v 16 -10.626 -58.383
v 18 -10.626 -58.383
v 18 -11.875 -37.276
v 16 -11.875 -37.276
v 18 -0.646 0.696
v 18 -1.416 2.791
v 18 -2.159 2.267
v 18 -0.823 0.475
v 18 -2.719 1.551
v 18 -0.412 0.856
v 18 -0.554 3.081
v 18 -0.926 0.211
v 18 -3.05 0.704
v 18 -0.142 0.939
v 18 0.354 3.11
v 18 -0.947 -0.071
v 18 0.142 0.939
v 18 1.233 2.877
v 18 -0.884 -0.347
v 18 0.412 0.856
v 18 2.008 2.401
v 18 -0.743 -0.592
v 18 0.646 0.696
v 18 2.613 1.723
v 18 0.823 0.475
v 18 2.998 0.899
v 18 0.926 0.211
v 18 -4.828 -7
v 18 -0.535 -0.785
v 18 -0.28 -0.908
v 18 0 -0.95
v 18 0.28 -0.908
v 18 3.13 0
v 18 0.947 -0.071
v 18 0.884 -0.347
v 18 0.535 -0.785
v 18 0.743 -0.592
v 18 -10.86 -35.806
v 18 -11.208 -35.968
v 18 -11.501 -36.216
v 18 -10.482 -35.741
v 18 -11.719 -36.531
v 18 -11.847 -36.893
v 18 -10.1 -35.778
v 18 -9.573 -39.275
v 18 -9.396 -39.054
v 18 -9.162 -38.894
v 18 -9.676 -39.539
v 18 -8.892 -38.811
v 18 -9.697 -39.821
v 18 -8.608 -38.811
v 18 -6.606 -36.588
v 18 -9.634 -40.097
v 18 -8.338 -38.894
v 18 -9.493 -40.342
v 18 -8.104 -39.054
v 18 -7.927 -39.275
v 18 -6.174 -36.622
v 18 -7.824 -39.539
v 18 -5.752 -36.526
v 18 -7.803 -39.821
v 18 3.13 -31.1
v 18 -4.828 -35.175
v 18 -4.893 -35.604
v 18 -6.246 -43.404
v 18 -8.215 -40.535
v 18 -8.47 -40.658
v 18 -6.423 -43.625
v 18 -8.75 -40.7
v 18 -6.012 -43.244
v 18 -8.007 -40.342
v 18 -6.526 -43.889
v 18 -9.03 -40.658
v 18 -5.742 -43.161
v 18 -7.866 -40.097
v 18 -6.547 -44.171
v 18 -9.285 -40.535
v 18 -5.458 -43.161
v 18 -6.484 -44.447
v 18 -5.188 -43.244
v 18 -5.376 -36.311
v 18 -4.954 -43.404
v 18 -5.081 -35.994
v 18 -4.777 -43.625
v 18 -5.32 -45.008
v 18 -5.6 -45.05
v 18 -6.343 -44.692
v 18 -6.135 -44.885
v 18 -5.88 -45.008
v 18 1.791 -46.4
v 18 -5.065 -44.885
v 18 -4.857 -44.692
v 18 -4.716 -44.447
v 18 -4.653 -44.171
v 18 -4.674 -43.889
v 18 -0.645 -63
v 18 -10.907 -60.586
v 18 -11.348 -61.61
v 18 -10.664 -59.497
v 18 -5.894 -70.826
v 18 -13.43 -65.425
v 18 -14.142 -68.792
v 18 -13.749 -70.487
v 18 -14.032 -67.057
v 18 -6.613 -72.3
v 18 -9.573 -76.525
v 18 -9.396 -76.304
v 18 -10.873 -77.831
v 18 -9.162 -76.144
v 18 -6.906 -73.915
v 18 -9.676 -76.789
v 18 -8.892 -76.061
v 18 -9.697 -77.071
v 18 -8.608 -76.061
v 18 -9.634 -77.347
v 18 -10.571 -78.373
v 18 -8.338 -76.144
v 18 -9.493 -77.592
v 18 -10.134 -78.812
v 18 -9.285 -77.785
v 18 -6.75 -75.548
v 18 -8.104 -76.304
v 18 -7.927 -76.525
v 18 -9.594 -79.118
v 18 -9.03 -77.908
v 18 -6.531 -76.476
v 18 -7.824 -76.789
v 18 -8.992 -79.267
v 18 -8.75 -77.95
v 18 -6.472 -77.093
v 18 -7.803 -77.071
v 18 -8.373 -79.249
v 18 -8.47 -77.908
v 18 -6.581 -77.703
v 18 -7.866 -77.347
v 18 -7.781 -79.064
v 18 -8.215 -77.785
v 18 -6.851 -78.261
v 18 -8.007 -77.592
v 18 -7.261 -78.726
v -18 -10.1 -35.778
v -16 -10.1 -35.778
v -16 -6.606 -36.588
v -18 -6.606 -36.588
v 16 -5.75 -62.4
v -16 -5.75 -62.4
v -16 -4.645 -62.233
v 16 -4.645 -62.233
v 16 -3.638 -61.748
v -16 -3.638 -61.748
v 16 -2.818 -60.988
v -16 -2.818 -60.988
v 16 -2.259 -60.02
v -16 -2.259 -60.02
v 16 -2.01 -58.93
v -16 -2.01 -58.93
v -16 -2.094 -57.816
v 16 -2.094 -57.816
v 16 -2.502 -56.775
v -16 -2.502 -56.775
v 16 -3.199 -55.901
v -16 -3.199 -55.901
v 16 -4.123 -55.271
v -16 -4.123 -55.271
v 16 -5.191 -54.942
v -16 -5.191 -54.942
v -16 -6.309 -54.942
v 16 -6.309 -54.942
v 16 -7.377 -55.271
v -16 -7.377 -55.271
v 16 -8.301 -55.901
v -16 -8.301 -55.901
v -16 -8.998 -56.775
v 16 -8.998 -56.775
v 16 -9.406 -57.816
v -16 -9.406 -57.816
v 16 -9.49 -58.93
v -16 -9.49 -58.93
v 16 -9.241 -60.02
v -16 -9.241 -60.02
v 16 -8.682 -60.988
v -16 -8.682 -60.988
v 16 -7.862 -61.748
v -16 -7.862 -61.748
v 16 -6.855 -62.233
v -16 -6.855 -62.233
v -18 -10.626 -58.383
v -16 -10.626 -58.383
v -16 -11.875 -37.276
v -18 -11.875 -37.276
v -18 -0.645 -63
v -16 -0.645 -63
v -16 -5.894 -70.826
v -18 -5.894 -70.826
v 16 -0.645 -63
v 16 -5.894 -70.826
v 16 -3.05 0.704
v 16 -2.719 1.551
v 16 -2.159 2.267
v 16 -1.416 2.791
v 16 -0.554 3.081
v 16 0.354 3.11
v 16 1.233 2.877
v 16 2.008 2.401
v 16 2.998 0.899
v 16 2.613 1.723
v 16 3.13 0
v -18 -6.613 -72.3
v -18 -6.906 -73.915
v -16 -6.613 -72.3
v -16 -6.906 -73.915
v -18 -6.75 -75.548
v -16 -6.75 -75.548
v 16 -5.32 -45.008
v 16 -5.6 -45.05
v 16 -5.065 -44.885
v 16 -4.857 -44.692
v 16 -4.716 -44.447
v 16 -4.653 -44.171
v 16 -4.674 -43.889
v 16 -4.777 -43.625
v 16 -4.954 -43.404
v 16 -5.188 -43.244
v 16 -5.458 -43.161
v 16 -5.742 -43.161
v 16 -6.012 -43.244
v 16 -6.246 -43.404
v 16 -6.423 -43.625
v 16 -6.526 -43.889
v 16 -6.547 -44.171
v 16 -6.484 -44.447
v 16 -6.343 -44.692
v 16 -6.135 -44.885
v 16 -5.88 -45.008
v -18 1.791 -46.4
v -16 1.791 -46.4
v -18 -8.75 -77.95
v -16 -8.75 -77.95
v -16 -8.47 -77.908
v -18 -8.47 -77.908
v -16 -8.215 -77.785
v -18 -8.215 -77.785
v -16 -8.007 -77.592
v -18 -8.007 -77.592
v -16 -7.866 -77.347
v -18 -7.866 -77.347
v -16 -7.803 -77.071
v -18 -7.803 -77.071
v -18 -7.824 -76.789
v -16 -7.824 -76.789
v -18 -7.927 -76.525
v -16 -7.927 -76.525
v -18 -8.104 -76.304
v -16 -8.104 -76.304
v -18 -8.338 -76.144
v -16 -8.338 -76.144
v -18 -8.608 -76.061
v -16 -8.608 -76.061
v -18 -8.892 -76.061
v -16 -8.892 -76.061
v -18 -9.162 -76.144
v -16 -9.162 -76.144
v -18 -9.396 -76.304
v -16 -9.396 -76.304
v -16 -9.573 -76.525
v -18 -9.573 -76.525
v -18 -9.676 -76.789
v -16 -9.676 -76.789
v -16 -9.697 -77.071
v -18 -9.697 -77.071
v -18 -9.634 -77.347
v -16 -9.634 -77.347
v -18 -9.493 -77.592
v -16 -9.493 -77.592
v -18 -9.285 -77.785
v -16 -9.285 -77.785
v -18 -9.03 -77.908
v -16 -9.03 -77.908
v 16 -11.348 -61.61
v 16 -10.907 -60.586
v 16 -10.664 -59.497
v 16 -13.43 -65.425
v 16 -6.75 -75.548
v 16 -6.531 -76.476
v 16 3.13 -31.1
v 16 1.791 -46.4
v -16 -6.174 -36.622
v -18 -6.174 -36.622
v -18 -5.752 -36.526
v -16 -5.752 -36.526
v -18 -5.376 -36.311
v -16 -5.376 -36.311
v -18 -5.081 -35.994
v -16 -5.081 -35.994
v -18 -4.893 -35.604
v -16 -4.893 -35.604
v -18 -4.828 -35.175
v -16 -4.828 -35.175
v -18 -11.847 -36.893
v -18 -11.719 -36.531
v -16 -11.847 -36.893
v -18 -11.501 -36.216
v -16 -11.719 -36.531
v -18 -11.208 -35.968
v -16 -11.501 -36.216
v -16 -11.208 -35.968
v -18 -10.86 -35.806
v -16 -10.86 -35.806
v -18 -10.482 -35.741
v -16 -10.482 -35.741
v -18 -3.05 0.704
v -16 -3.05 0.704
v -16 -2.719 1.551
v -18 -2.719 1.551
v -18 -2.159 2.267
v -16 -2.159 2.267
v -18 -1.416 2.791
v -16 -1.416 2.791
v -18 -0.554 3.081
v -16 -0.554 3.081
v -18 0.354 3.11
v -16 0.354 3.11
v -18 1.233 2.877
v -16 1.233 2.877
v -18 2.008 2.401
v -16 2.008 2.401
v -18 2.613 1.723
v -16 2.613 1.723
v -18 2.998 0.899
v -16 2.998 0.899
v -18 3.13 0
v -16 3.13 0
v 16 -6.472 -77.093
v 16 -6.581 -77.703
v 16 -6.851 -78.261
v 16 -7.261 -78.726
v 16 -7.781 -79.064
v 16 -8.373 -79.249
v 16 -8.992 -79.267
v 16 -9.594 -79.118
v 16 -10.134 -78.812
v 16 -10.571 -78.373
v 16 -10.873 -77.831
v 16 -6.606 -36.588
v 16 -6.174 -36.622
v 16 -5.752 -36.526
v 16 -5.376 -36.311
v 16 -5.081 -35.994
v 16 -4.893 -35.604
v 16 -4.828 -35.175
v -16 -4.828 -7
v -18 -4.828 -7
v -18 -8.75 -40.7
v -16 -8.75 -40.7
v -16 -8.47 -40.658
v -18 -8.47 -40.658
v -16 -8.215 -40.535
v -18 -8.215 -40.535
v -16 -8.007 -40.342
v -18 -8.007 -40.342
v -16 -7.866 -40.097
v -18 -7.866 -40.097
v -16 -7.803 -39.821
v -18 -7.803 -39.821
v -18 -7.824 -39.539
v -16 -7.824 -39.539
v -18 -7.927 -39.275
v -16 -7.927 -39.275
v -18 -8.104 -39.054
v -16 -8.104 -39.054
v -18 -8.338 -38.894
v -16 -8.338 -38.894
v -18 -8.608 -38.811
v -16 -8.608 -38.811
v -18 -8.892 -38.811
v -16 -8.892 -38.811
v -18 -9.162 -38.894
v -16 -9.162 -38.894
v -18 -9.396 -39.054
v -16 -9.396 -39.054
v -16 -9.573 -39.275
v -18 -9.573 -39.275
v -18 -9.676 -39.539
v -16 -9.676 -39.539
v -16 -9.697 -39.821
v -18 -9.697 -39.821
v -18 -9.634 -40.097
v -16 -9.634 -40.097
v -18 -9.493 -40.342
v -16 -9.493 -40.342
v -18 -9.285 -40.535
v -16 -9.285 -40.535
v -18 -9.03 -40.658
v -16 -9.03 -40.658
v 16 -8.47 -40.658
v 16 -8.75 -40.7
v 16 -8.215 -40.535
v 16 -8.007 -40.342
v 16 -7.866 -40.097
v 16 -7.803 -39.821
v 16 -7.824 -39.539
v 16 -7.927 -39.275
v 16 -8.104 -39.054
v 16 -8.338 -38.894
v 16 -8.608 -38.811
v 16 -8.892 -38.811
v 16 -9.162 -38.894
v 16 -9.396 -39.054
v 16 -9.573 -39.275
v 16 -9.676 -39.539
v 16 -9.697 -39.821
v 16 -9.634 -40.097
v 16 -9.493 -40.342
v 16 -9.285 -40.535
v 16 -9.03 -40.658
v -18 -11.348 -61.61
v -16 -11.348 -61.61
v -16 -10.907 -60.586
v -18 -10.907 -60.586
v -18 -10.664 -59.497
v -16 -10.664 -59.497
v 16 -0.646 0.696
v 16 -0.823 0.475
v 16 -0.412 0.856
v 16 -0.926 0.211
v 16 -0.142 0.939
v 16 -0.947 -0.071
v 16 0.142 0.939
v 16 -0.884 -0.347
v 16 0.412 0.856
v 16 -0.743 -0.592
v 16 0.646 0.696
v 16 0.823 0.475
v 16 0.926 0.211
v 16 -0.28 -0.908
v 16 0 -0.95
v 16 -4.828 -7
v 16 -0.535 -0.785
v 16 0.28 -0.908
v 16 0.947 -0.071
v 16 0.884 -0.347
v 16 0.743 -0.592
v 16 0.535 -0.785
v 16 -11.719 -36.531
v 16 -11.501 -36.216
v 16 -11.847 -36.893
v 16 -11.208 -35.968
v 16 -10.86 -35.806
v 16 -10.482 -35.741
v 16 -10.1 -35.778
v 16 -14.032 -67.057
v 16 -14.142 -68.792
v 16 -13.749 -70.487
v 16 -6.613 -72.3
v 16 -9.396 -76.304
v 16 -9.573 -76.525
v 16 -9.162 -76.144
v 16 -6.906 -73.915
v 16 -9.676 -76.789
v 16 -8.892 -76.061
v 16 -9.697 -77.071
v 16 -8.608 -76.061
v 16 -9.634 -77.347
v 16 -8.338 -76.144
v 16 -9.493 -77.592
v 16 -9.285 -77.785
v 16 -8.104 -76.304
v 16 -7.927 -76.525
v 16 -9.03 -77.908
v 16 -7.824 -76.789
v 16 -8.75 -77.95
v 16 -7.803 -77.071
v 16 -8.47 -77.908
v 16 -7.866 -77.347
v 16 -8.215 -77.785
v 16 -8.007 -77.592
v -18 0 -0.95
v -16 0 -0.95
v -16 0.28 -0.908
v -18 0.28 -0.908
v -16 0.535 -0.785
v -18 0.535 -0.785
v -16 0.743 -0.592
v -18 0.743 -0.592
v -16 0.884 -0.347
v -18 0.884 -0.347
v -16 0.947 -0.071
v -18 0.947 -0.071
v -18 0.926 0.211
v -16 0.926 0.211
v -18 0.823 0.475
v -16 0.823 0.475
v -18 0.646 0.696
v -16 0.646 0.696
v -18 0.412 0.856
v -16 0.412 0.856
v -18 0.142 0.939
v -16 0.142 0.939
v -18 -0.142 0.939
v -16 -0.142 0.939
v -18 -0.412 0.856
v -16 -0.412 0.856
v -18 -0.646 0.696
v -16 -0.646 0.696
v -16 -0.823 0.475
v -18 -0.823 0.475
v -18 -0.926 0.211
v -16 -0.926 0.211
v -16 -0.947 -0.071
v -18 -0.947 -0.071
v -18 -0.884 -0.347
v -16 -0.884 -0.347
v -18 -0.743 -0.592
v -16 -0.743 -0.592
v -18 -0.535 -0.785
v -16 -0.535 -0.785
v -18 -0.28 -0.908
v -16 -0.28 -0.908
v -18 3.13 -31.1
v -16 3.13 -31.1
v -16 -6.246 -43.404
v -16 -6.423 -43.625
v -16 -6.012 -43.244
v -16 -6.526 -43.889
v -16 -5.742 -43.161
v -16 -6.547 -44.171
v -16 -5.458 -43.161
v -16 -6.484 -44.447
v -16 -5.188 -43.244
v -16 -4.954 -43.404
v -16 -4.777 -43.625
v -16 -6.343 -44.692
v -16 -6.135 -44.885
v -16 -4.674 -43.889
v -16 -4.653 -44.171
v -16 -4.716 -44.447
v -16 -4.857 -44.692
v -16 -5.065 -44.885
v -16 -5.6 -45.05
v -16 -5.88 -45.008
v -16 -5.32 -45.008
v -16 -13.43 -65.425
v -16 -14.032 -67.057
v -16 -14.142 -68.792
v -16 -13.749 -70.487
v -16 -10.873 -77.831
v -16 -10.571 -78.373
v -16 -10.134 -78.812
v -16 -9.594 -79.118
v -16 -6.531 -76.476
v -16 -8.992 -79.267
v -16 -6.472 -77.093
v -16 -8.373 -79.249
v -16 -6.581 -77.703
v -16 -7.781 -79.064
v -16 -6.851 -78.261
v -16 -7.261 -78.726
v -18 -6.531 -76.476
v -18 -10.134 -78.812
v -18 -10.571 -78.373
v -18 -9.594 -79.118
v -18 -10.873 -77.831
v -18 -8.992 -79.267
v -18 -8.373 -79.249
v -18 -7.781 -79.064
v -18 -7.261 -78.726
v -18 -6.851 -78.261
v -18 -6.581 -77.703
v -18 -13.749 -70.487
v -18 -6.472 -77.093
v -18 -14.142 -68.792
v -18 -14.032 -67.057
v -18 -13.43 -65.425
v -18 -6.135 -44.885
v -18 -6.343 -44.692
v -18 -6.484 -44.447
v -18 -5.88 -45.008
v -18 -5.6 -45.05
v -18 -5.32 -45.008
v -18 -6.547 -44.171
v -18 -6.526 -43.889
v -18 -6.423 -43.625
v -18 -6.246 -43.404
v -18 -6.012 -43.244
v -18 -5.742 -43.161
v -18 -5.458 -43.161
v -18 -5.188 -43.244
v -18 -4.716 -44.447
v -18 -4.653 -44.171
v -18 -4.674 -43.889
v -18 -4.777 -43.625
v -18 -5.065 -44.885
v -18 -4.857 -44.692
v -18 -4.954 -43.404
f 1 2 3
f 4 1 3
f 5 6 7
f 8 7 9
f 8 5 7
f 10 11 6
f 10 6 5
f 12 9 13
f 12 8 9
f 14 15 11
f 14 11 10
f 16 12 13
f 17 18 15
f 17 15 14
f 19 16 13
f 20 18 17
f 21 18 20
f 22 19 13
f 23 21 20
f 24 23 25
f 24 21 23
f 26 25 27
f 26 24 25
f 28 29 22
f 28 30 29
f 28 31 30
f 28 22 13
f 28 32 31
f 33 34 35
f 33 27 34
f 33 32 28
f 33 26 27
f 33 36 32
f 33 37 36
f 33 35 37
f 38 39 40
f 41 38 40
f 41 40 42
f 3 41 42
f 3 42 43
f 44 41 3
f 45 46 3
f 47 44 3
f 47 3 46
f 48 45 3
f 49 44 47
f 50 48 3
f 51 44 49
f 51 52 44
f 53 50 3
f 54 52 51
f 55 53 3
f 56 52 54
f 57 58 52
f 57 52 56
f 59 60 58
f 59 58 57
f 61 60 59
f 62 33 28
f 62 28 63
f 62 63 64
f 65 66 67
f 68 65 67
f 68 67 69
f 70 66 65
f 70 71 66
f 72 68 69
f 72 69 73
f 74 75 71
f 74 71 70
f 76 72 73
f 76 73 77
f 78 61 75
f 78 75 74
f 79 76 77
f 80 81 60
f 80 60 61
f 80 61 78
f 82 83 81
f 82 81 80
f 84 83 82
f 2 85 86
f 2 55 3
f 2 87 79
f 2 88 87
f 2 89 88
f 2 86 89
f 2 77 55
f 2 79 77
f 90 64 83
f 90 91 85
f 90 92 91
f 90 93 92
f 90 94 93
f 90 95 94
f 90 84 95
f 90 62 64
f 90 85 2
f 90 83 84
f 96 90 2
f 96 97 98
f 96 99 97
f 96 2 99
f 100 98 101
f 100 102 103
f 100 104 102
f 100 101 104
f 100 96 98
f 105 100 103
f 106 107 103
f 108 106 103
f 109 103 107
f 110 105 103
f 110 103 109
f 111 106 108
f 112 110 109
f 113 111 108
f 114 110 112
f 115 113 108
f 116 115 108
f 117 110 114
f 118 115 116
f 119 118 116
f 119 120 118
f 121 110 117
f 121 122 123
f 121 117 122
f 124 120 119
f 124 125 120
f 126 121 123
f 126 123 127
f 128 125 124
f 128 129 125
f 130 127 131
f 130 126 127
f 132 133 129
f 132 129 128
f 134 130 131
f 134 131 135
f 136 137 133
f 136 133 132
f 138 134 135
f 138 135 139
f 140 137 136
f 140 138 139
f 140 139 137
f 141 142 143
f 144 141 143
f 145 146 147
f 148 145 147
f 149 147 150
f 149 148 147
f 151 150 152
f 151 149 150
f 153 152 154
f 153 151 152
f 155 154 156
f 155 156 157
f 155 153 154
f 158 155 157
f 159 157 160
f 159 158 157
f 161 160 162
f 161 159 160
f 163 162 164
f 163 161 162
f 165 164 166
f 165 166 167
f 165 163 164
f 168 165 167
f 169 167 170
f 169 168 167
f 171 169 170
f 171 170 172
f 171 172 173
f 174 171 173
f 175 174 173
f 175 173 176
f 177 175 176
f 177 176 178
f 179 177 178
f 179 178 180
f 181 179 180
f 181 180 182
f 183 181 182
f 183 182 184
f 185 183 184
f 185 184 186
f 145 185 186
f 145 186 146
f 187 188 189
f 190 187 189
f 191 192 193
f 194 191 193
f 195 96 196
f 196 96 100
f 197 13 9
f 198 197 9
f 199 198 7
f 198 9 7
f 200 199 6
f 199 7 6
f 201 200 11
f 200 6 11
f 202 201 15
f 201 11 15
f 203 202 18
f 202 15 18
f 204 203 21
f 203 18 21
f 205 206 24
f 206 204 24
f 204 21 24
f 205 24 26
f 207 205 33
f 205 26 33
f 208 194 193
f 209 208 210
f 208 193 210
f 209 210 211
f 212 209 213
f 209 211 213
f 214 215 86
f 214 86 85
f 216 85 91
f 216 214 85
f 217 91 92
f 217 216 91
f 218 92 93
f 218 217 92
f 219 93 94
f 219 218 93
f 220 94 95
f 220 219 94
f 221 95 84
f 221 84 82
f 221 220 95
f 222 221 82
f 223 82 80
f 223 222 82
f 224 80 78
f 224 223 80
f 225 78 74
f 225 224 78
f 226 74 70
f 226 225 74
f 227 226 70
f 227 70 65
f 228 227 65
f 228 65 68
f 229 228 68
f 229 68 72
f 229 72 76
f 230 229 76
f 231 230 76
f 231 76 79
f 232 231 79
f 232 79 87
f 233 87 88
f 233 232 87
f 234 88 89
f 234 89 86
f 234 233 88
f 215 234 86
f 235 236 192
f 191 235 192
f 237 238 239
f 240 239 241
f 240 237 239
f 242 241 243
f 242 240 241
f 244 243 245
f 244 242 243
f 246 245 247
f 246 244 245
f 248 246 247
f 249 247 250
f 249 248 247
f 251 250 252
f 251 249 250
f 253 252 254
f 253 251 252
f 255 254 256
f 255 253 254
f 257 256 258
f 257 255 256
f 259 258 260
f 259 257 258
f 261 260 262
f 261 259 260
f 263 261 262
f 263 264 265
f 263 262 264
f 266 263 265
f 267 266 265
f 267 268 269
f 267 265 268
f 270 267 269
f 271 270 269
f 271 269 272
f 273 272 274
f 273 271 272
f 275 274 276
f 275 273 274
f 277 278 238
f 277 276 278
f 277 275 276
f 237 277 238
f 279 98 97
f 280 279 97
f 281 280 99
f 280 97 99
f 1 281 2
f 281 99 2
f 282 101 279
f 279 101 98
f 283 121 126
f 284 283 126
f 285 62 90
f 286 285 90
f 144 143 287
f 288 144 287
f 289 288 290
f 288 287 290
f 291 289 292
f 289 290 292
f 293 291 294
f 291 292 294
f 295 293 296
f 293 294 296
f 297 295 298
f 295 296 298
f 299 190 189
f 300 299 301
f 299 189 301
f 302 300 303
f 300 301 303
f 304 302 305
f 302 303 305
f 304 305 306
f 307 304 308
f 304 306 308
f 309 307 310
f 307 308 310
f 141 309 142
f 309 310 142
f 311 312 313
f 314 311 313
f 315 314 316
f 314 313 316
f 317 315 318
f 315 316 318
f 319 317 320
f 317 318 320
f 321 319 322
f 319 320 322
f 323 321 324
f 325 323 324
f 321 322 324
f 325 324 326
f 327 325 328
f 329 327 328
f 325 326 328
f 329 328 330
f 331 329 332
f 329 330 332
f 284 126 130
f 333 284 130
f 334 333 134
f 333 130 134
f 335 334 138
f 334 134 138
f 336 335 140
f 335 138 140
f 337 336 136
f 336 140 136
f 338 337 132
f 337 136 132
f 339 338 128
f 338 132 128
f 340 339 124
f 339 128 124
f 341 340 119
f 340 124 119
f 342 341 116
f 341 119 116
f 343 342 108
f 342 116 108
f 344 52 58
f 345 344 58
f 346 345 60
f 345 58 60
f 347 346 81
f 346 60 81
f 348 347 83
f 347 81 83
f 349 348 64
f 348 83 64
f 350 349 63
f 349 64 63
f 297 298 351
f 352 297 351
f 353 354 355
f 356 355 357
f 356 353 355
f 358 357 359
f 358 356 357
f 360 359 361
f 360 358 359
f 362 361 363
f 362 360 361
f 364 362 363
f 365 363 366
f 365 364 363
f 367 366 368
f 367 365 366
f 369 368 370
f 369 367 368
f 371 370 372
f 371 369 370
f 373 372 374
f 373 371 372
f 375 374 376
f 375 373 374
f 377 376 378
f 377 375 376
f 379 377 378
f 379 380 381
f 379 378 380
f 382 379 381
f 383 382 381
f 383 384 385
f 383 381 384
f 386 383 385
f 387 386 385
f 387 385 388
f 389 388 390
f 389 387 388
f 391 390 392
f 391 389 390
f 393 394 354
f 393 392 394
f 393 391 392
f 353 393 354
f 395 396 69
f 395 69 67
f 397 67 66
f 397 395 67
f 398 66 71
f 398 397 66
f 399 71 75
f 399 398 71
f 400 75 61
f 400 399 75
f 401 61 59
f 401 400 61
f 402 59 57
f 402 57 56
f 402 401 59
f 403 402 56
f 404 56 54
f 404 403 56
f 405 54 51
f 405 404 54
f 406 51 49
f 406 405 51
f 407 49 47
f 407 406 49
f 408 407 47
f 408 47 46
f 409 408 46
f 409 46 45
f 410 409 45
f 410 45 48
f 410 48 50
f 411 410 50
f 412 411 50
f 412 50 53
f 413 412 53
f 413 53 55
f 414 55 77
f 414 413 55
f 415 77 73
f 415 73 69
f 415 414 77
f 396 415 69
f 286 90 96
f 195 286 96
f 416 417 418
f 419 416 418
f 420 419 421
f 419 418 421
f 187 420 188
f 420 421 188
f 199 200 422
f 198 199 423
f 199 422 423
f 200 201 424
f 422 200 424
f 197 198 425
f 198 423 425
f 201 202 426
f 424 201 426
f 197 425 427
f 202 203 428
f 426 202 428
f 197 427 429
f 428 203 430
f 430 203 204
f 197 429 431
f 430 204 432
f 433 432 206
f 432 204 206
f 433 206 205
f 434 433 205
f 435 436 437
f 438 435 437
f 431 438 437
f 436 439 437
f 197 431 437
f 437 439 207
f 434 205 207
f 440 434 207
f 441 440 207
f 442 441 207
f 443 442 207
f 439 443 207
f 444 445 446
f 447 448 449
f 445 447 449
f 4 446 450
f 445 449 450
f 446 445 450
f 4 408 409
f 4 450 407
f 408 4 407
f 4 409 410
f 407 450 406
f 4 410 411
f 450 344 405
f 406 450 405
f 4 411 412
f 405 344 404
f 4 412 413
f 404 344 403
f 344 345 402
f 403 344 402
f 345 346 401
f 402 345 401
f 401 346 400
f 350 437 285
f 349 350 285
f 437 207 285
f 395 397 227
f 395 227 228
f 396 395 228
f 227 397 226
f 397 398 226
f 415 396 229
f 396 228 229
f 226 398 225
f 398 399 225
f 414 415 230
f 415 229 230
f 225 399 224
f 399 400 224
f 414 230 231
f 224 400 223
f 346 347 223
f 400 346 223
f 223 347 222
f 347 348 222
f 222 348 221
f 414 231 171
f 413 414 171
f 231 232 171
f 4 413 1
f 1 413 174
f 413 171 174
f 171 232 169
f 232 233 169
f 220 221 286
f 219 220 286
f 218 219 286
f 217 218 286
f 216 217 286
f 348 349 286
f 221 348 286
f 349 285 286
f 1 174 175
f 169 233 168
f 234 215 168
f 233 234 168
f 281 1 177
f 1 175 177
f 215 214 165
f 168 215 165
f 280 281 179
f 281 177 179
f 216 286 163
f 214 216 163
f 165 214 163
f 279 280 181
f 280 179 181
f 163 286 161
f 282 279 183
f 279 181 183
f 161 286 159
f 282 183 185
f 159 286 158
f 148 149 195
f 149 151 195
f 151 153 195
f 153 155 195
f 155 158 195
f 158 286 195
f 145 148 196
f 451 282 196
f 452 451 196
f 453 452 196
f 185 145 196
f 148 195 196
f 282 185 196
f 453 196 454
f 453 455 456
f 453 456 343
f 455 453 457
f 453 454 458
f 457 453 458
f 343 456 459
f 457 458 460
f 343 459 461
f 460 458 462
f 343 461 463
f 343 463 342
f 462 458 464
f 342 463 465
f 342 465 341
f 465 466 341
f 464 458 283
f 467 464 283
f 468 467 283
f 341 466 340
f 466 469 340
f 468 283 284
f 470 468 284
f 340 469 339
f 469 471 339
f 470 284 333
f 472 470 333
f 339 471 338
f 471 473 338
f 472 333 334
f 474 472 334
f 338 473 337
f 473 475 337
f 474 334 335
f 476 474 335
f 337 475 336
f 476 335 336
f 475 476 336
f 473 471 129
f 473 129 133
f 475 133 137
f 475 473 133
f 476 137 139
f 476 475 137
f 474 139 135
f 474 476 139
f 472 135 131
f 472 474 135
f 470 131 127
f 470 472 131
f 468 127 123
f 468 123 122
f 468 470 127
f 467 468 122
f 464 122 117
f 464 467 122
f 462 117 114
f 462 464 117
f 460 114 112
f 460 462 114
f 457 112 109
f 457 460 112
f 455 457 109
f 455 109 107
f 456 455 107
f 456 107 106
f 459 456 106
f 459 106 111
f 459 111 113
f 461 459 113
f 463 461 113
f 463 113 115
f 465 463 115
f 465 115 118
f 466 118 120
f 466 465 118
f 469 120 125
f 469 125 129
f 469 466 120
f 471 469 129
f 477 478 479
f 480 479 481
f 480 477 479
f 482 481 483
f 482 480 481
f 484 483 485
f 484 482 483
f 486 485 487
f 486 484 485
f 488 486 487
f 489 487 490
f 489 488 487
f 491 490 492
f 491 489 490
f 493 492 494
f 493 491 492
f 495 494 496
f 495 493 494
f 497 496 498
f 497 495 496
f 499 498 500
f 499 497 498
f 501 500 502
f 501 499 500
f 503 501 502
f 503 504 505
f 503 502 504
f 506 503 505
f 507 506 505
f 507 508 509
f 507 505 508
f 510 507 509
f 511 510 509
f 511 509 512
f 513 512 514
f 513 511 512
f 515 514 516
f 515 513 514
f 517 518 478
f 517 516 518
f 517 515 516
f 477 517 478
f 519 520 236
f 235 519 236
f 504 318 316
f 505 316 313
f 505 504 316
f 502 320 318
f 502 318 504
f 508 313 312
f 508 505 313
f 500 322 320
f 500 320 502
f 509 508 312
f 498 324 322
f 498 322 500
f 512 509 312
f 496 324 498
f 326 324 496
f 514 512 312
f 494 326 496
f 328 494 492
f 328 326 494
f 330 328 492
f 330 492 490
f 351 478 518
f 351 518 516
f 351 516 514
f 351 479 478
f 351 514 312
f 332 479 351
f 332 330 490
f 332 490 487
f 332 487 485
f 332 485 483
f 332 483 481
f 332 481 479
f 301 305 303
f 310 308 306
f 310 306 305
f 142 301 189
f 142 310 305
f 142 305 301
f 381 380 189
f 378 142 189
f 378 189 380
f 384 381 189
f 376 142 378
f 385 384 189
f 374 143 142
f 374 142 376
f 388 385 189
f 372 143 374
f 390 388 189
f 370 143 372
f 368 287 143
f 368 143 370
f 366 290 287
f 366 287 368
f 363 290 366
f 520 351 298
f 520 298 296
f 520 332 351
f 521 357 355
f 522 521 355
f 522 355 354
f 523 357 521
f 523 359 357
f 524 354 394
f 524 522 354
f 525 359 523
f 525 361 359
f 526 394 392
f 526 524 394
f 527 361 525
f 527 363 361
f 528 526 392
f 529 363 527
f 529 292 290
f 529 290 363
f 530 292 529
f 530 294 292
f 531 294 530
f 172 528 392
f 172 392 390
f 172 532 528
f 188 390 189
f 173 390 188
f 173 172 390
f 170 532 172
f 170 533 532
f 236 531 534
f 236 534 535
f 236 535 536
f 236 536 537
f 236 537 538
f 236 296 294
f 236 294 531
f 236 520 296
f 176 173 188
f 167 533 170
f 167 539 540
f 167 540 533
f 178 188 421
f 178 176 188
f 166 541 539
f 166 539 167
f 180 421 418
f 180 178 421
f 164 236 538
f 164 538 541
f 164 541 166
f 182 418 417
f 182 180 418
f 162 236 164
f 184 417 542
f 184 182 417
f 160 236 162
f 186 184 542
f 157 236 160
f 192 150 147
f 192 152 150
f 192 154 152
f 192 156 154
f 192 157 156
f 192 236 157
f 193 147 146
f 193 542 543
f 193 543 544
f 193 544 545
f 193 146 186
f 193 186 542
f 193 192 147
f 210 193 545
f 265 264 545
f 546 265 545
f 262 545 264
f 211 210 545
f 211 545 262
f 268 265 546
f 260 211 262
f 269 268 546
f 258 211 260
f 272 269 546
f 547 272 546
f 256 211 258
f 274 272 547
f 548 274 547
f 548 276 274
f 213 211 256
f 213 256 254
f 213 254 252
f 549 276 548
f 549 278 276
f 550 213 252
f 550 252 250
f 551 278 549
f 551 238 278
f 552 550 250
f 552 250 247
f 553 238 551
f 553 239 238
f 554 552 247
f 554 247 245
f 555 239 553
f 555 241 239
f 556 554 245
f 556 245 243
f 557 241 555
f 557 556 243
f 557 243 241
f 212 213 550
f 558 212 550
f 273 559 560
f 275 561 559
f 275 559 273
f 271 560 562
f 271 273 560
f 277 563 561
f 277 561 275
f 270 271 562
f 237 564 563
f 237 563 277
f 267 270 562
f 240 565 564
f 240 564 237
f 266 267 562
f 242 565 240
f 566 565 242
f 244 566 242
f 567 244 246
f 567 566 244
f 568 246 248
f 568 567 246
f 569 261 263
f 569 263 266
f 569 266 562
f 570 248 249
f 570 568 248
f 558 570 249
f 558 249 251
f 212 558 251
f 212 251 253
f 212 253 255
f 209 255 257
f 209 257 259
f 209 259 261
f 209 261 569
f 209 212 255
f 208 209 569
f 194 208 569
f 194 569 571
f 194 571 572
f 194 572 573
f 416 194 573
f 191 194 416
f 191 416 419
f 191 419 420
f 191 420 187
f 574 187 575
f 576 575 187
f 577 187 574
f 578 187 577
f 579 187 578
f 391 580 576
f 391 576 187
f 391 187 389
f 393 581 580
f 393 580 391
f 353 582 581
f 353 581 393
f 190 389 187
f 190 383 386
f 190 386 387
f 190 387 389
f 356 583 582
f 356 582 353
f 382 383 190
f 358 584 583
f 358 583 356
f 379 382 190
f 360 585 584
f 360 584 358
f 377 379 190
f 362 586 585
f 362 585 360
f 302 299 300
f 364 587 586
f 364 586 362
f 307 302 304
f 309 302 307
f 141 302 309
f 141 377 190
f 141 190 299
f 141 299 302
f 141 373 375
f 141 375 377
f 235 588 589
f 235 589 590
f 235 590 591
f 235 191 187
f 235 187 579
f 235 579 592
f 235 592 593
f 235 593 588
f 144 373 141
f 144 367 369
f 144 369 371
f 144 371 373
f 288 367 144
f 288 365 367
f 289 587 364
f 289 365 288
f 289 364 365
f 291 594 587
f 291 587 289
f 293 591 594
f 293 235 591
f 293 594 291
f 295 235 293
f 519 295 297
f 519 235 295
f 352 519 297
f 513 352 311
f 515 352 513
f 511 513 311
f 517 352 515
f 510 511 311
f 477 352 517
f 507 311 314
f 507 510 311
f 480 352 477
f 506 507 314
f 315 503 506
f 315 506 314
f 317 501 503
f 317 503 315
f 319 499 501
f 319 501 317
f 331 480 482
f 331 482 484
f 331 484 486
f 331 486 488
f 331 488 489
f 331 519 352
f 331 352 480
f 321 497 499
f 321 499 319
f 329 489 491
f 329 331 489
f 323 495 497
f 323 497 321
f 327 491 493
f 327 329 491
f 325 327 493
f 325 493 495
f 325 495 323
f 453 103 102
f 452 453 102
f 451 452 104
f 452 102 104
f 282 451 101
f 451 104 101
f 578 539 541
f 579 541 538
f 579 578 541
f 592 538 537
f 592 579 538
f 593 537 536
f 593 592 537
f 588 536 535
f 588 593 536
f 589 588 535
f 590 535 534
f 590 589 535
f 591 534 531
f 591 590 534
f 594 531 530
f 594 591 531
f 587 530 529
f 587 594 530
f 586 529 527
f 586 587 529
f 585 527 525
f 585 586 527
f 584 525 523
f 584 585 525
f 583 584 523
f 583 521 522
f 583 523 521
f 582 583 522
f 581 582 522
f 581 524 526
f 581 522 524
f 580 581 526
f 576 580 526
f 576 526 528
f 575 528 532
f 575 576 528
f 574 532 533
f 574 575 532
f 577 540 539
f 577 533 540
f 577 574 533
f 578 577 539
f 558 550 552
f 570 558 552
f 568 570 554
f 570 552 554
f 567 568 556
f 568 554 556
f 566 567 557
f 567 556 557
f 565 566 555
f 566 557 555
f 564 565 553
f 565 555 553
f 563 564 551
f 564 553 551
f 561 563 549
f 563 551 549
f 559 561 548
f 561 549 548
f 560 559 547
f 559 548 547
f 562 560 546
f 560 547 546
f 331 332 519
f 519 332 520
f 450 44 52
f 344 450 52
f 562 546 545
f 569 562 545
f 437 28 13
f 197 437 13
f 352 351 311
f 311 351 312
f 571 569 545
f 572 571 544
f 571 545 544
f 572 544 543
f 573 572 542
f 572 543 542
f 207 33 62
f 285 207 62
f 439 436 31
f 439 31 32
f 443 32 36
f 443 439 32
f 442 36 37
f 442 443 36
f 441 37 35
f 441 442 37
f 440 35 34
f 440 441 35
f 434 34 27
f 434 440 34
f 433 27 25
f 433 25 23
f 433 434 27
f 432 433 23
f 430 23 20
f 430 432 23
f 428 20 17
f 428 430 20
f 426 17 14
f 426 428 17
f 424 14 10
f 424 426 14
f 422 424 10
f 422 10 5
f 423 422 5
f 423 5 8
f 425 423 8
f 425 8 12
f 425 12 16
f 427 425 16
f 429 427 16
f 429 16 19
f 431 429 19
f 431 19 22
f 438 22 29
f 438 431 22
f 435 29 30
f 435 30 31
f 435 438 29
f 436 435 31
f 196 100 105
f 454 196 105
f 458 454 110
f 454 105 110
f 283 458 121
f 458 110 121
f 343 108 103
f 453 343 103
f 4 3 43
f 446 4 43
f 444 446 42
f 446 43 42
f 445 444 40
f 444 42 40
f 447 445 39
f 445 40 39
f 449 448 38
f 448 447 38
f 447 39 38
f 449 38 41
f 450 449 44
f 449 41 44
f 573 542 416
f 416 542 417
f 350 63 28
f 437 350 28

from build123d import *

# Parameters (mm, degrees)
SKETCH1_R           = 0.95
BOSS_EXTRUDE1_DEPTH = 18
SKETCH2_W           = 32
SKETCH2_H           = 82.41
CUT_EXTRUDE1_DEPTH  = 18
SKETCH3_R           = 3.75
BOSS_EXTRUDE2_DEPTH = 34


with BuildPart() as part:
    # Sketch1 → Boss-Extrude1 (new, symmetric)
    with BuildSketch(Plane(origin=(0, 0, 0), x_dir=(0, 0, -1), z_dir=(1, 0, 0))):
        with BuildLine():
            Line((0, 3.13), (31.1, 3.13))
            Line((31.1, 3.13), (46.4, 1.791423448))
            Line((46.4, 1.791423448), (63, -0.645051075))
            Line((63, -0.645051075), (70.82606591, -5.894041546))
            ThreePointArc((70.82606591, -5.894041546), (73.097461385, -6.814738199), (75.547517331, -6.750351941))
            Line((75.547517331, -6.750351941), (76.475855369, -6.531065029))
            ThreePointArc((76.475855369, -6.531065029), (79.176402306, -8.070534767), (77.831396153, -10.873012114))
            Line((77.831396153, -10.873012114), (70.486743317, -13.749263303))
            ThreePointArc((70.486743317, -13.749263303), (67.920640594, -14.150456708), (65.425410054, -13.429579543))
            Line((65.425410054, -13.429579543), (61.610342493, -11.348317948))
            ThreePointArc((61.610342493, -11.348317948), (60.047195579, -10.760330177), (58.382530932, -10.625981737))
            Line((58.382530932, -10.625981737), (37.275936798, -11.874727235))
            ThreePointArc((37.275936798, -11.874727235), (36.082237819, -11.362512436), (35.77777119, -10.099745108))
            Line((35.77777119, -10.099745108), (36.587860094, -6.605922434))
            ThreePointArc((36.587860094, -6.605922434), (36.310540144, -5.376298946), (35.17533219, -4.828409195))
            Line((35.17533219, -4.828409195), (7, -4.828409195))
            Line((7, -4.828409195), (-0.7040968, -3.049778303))
            ThreePointArc((-0.7040968, -3.049778303), (-3.109879908, 0.354326059), (0, 3.13))
        make_face()
        Circle(SKETCH1_R, mode=Mode.SUBTRACT)
        with Locations((77, -8.75)):
            Circle(SKETCH1_R, mode=Mode.SUBTRACT)
        with Locations((39.75, -8.75)):
            Circle(SKETCH1_R, mode=Mode.SUBTRACT)
        with Locations((44.1, -5.6)):
            Circle(SKETCH1_R, mode=Mode.SUBTRACT)
    extrude(amount=BOSS_EXTRUDE1_DEPTH, both=True)

    # Sketch2 → Cut-Extrude1 (cut, symmetric)
    with BuildSketch(Plane(origin=(0, 0, 0), x_dir=(1, 0, 0), z_dir=(0, 1, 0))):
        with Locations((0, 38.075)):
            Rectangle(SKETCH2_W, SKETCH2_H)
    extrude(amount=CUT_EXTRUDE1_DEPTH, both=True, mode=Mode.SUBTRACT)


with BuildPart() as cut_extrude1_piece_1:
    # of the separate pieces the step leaves, piece 1, a body of its own (cut_extrude1_pieces)
    add(part.part.solids().sort_by_distance((16, -4.828409195, -35.17533219))[0])



with BuildPart() as cut_extrude1_piece_2:
    # of the separate pieces the step leaves, piece 2, a body of its own (cut_extrude1_pieces)
    add(part.part.solids().sort_by_distance((-18, -4.828409195, -35.17533219))[0])


with BuildPart() as cut_extrude1_piece_1_1:
    add(cut_extrude1_piece_1.part)

    add(cut_extrude1_piece_2.part)  # Boss-Extrude2 merges Cut-Extrude1 piece 2
    # Sketch3 → Boss-Extrude2 (add)
    with BuildSketch(Plane(origin=(18, 0, 0), x_dir=(0, 0, -1), z_dir=(1, 0, 0))):
        with Locations((58.65, -5.75)):
            Circle(SKETCH3_R)
    extrude(amount=-BOSS_EXTRUDE2_DEPTH)


solid = cut_extrude1_piece_1_1.part
